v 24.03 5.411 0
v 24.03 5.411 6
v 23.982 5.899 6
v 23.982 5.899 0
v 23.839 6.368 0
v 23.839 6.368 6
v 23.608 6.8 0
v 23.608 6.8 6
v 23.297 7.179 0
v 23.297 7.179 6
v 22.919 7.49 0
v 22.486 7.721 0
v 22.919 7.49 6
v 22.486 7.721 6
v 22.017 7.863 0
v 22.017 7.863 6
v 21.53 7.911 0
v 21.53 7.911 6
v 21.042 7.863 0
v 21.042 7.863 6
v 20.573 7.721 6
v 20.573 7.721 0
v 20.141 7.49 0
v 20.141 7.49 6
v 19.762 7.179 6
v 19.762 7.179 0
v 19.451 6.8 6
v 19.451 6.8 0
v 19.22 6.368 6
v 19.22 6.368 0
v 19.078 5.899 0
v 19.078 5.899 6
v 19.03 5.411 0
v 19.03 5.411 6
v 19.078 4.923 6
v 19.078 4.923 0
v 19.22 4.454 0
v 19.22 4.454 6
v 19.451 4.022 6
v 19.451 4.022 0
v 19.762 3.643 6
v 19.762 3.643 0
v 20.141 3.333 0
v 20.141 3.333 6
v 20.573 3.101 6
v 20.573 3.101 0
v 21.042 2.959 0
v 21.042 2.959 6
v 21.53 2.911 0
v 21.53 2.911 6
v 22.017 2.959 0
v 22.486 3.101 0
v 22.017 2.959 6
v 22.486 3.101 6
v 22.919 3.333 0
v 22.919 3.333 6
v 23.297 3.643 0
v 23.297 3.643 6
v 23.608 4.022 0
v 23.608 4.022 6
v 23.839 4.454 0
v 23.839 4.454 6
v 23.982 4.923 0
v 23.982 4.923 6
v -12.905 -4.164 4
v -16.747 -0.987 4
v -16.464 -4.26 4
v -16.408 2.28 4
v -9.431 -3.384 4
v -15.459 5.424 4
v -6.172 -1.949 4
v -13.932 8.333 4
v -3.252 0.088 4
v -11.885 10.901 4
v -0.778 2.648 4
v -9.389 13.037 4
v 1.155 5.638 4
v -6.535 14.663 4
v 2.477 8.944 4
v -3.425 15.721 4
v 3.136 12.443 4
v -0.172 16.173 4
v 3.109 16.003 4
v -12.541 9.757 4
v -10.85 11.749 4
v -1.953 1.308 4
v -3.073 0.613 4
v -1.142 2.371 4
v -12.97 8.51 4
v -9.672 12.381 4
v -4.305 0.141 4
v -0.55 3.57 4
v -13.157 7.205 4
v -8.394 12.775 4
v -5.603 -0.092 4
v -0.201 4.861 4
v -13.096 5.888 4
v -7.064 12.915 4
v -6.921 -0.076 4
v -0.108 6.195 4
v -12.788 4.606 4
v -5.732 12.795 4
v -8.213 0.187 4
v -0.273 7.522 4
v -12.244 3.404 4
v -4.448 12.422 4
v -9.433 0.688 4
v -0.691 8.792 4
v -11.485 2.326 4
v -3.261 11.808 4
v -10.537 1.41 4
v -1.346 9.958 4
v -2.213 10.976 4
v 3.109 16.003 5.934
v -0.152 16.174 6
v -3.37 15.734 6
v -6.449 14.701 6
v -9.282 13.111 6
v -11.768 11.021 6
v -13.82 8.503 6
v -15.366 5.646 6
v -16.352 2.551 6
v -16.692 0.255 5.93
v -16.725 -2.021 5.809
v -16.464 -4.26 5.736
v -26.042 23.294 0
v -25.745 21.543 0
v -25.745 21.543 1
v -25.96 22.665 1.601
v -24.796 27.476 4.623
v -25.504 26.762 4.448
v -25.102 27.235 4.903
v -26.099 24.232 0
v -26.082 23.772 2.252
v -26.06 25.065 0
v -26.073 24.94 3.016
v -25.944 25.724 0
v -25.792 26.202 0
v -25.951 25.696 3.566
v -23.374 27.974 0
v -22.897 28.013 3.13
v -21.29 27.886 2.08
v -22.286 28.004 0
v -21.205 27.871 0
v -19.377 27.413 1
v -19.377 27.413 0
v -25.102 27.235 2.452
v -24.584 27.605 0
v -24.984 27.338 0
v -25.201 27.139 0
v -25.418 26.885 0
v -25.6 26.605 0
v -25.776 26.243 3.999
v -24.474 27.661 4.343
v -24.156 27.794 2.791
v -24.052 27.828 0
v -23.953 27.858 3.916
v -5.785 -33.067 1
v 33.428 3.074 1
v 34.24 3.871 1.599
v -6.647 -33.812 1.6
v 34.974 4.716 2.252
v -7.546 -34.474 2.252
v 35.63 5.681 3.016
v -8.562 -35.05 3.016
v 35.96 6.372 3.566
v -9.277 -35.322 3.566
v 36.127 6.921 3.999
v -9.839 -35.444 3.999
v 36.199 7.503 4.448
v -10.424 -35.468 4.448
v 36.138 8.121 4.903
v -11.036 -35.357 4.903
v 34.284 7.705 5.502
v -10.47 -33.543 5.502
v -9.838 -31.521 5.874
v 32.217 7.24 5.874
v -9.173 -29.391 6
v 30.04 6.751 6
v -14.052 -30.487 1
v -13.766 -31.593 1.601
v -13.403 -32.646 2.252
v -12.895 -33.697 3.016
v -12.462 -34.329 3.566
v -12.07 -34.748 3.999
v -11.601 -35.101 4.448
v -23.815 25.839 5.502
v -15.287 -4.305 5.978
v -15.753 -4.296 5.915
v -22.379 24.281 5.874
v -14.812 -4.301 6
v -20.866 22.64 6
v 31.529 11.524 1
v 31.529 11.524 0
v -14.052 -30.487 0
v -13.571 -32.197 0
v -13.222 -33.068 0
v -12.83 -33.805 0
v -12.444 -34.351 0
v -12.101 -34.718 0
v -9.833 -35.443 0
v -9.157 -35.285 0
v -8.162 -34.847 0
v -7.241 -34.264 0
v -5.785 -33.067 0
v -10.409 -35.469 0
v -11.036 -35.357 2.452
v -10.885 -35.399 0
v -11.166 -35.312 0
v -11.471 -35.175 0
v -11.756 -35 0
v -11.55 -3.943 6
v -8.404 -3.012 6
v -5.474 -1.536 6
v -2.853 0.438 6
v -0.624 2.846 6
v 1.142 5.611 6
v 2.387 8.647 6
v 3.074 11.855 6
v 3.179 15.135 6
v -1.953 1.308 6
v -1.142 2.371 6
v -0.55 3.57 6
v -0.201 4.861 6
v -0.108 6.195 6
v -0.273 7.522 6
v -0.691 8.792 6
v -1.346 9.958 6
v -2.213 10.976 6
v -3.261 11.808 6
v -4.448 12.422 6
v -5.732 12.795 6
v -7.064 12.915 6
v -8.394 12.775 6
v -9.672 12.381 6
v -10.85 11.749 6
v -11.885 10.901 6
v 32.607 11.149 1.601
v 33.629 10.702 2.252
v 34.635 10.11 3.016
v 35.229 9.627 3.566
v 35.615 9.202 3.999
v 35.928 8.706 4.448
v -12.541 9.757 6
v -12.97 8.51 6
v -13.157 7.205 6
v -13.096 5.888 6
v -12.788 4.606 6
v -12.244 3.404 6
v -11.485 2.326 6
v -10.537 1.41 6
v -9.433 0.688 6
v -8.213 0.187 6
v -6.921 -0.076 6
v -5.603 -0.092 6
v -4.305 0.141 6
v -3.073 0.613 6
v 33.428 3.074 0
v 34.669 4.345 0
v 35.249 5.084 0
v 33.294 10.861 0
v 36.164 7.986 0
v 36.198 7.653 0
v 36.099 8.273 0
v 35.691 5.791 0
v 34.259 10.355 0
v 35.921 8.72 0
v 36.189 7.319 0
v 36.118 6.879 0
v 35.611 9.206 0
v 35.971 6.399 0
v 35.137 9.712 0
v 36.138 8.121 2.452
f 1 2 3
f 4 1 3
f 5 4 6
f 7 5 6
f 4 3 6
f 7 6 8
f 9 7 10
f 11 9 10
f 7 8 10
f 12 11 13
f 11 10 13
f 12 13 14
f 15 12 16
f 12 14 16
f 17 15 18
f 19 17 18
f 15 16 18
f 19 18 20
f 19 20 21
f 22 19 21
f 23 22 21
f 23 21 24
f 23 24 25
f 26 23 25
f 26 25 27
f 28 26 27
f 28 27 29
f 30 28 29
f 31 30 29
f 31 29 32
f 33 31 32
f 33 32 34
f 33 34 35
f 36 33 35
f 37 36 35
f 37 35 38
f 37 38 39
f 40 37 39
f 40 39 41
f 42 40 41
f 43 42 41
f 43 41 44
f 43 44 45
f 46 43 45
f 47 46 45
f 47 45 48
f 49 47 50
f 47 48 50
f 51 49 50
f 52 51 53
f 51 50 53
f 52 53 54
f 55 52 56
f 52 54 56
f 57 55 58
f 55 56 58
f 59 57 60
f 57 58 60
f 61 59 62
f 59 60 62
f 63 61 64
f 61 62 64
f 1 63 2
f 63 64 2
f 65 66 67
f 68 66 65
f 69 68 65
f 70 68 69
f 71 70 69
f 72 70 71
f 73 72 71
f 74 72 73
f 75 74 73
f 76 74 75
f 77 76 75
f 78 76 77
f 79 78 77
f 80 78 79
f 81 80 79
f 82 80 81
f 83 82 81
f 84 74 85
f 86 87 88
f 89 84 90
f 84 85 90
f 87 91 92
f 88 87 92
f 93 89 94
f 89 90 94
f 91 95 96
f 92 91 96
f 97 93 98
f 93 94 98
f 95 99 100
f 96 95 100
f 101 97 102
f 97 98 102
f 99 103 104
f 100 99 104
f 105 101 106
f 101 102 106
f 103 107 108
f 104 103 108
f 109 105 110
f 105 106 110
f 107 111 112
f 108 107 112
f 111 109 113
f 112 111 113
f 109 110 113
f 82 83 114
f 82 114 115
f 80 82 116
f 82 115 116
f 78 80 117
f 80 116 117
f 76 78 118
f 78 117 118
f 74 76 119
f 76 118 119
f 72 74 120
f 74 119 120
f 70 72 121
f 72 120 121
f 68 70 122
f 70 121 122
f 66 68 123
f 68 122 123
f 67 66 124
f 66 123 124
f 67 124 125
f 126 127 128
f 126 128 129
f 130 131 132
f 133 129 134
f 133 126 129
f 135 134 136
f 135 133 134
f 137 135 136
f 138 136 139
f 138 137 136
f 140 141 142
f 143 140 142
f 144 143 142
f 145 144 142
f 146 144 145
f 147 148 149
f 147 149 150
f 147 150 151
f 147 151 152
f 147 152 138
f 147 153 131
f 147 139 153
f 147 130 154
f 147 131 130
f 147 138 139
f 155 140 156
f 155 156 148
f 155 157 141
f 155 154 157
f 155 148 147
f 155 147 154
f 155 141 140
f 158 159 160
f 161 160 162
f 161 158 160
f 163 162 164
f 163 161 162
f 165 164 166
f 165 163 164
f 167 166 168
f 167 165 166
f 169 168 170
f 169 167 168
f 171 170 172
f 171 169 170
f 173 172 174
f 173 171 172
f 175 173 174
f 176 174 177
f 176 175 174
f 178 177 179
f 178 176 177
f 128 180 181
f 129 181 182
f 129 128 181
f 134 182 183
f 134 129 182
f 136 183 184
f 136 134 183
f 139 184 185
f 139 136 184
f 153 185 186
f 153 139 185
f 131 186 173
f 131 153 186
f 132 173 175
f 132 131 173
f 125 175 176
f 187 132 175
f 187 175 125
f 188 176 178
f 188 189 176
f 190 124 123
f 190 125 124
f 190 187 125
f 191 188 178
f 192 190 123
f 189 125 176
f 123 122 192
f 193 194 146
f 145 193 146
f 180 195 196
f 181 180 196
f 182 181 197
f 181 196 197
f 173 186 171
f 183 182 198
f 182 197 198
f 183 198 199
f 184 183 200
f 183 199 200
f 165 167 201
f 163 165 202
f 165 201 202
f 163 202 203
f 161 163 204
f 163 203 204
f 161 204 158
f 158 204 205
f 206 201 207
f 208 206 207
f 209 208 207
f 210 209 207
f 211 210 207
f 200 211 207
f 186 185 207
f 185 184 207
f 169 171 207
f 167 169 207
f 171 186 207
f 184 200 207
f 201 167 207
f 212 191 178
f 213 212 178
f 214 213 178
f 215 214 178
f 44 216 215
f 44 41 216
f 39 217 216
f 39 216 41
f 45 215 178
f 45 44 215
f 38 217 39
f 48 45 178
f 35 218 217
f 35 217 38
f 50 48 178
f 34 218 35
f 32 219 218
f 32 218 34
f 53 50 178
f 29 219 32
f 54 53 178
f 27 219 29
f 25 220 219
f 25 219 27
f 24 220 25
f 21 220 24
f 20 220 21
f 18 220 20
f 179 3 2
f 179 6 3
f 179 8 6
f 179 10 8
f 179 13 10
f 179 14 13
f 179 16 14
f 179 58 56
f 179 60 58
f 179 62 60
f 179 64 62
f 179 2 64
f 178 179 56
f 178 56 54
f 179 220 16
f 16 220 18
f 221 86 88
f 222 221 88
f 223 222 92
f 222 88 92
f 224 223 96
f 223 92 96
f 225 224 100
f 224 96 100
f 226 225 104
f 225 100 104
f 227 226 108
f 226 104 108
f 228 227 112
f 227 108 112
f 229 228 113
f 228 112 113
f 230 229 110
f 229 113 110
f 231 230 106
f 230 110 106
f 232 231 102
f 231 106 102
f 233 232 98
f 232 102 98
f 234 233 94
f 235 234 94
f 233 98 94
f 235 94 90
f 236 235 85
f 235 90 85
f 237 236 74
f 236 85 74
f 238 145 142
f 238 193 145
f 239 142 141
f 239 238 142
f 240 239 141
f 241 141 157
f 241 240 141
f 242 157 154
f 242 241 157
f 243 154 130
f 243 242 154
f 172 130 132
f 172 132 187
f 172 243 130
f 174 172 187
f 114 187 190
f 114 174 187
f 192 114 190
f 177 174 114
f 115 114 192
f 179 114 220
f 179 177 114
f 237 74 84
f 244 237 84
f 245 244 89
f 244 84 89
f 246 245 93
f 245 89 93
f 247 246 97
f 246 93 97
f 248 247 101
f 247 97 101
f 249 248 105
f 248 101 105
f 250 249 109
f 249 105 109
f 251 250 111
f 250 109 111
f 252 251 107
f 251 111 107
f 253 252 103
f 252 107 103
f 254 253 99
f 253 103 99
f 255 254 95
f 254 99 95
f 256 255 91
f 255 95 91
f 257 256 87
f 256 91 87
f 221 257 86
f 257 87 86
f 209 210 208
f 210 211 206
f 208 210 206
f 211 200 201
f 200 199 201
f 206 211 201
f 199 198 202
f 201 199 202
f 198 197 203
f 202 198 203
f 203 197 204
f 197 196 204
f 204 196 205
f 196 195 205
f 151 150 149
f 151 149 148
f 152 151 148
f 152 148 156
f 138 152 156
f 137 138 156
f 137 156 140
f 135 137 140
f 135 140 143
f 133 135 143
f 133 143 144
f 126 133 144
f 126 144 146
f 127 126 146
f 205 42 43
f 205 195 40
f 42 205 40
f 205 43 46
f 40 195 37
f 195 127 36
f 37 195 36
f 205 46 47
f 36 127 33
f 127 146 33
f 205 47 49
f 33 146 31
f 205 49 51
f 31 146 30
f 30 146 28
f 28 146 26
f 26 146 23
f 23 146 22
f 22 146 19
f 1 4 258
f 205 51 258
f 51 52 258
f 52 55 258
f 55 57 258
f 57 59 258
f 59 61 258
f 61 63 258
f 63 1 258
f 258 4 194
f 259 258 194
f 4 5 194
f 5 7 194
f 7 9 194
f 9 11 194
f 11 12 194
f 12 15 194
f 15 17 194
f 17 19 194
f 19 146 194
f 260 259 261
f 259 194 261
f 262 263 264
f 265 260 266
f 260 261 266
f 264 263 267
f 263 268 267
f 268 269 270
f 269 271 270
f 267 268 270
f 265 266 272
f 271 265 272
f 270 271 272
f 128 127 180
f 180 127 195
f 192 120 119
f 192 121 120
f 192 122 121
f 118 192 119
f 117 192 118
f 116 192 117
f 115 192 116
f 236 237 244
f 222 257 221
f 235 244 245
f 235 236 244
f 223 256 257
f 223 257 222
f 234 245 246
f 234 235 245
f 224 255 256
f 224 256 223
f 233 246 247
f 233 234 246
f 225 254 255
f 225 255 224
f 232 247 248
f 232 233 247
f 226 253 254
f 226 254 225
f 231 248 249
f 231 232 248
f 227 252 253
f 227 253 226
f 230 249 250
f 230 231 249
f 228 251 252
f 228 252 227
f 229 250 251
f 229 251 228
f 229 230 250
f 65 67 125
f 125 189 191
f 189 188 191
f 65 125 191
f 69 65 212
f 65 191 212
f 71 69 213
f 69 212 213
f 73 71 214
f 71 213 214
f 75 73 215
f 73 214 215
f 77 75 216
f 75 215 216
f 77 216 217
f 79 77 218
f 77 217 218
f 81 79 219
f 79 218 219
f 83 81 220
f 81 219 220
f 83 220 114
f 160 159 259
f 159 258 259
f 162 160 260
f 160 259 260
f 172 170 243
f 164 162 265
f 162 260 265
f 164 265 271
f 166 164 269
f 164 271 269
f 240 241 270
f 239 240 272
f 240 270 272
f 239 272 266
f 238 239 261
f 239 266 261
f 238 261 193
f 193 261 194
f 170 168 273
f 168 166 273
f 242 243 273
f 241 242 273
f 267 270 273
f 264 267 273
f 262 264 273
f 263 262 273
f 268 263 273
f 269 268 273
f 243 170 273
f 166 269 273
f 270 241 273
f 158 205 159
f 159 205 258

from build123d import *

# Parameters (mm, degrees)
F1_DEPTH    = 6
F3_DEPTH    = 2
F5_DEPTH    = 2
F6_T1_DEPTH = 95.6484477973
F6_T3_DEPTH = 95.6484477973
F6_T5_DEPTH = 95.6484477973
F7_T1_DEPTH = 44.3012701892
F8_R        = 2.5
F9_DEPTH    = 32.8


# Not quite as in the source:
# - a fillet or chamfer that OpenCascade refuses, or shapes differently, is made with other operations: its cross-section is extruded or revolved along the edge and cut away or added
# - a feature of the source that left no trace in its solid (it failed there, or was rolled back) is left out


with BuildPart() as f1:
    # F0 (on Top) → F1 (new body)
    with BuildSketch(Plane.XY):
        Polygon((-12.152816169, -38.9364026487), (39.7963219102, 8.9435537945), (-27.6435057413, 29.9928488542), align=None)
    extrude(amount=F1_DEPTH)

    # F2 (on face) → F3 (cut)
    with BuildSketch(Plane.XY.offset(6)):
        with BuildLine():
            ThreePointArc((-16.4638161659, -4.259868525), (-1.9528341067, 1.3079860402), (3.1085531227, 16.0032901913))
            ThreePointArc((3.1085531227, 16.0032901913), (-11.8846429173, 10.9012104958), (-16.4638161659, -4.259868525))
        make_face()
    extrude(amount=-F3_DEPTH, mode=Mode.SUBTRACT)

    # F6: fillet of radius 5 on 3 edges, made by hand

    # F6_s2 → F6_t1 (cut)
    with BuildSketch(Plane(origin=(-10.4861497959, 46.660444211, 0), x_dir=(0, 0, 1), z_dir=(0.2192644008, -0.9756654768, 0))):
        with BuildLine():
            ThreePointArc((1, 20.3944501768), (4.5355339059, 18.9299840827), (6, 15.3944501768))
            Line((6, 15.3944501768), (6, 20.3944501768))
            Line((6, 20.3944501768), (1, 20.3944501768))
        make_face()
    extrude(amount=F6_T1_DEPTH, mode=Mode.SUBTRACT)

    # F6_s4 → F6_t3 (cut)
    with BuildSketch(Plane(origin=(45.6522049365, -14.2489499944, 0), x_dir=(0, 0, 1), z_dir=(-0.9545832889, 0.2979441972, 0))):
        with BuildLine():
            ThreePointArc((1, 20.3944501768), (4.5355339059, 18.9299840827), (6, 15.3944501768))
            Line((6, 15.3944501768), (6, 20.3944501768))
            Line((6, 20.3944501768), (1, 20.3944501768))
        make_face()
    extrude(amount=F6_T3_DEPTH, mode=Mode.SUBTRACT)

    # F6_s6 → F6_t5 (cut)
    with BuildSketch(Plane(origin=(-35.1660551406, -32.4114942166, 0), x_dir=(0, 0, 1), z_dir=(0.7353188881, 0.6777212796, 0))):
        with BuildLine():
            ThreePointArc((1, 20.3944501768), (4.5355339059, 18.9299840827), (6, 15.3944501768))
            Line((6, 15.3944501768), (6, 20.3944501768))
            Line((6, 20.3944501768), (1, 20.3944501768))
        make_face()
    extrude(amount=F6_T5_DEPTH, mode=Mode.SUBTRACT)

    # F7: fillet of radius 5 on 3 edges, made by hand

    # F7_s2 → F7_t1 (cut)
    with BuildSketch(Plane.XY.offset(-21.6506350946)):
        with BuildLine():
            add(Edge.make_bspline(
                [(-25.7446203291, 21.5433379695), (-27.6435057413, 29.9928488542), (-19.3765719594, 27.4125764177)],
                knots=[0, 0, 0, 1, 1, 1], degree=2, weights=[1, 1, 1]))
            Line((-19.3765719594, 27.4125764177), (-27.6435057413, 29.9928488542))
            Line((-27.6435057413, 29.9928488542), (-25.7446203291, 21.5433379695))
        make_face()
        with BuildLine():
            add(Edge.make_bspline(
                [(-14.0517015812, -30.4868917639), (-12.152816169, -38.9364026487), (-5.7847677993, -33.0671642005)],
                knots=[0, 0, 0, 1, 1, 1], degree=2, weights=[1, 1, 1]))
            Line((-5.7847677993, -33.0671642005), (-12.152816169, -38.9364026487))
            Line((-12.152816169, -38.9364026487), (-14.0517015812, -30.4868917639))
        make_face()
        with BuildLine():
            add(Edge.make_bspline(
                [(33.4282735406, 3.0743153463), (39.7963219102, 8.9435537945), (31.5293881284, 11.523826231)],
                knots=[0, 0, 0, 1, 1, 1], degree=2, weights=[1, 1, 1]))
            Line((31.5293881284, 11.523826231), (39.7963219102, 8.9435537945))
            Line((39.7963219102, 8.9435537945), (33.4282735406, 3.0743153463))
        make_face()
    extrude(amount=F7_T1_DEPTH, mode=Mode.SUBTRACT)

    # F8 (on face) → F9 (cut)
    with BuildSketch(Plane.XY.offset(6)):
        with Locations((21.5296056122, 5.4111843929)):
            Circle(F8_R)
    extrude(amount=-F9_DEPTH, mode=Mode.SUBTRACT)


with BuildPart() as f5:
    # F4 (on face) → F5 (new body)
    with BuildSketch(Plane.XY.offset(4)):
        with BuildLine():
            ThreePointArc((-11.8846429173, 10.9012104958), (-11.0325286439, 1.8456155594), (-1.9528341067, 1.3079860402))
            ThreePointArc((-1.9528341067, 1.3079860402), (-2.2132820516, 10.9761296439), (-11.8846429173, 10.9012104958))
        make_face()
    extrude(amount=F5_DEPTH)


solid = Compound([f1.part, f5.part])
